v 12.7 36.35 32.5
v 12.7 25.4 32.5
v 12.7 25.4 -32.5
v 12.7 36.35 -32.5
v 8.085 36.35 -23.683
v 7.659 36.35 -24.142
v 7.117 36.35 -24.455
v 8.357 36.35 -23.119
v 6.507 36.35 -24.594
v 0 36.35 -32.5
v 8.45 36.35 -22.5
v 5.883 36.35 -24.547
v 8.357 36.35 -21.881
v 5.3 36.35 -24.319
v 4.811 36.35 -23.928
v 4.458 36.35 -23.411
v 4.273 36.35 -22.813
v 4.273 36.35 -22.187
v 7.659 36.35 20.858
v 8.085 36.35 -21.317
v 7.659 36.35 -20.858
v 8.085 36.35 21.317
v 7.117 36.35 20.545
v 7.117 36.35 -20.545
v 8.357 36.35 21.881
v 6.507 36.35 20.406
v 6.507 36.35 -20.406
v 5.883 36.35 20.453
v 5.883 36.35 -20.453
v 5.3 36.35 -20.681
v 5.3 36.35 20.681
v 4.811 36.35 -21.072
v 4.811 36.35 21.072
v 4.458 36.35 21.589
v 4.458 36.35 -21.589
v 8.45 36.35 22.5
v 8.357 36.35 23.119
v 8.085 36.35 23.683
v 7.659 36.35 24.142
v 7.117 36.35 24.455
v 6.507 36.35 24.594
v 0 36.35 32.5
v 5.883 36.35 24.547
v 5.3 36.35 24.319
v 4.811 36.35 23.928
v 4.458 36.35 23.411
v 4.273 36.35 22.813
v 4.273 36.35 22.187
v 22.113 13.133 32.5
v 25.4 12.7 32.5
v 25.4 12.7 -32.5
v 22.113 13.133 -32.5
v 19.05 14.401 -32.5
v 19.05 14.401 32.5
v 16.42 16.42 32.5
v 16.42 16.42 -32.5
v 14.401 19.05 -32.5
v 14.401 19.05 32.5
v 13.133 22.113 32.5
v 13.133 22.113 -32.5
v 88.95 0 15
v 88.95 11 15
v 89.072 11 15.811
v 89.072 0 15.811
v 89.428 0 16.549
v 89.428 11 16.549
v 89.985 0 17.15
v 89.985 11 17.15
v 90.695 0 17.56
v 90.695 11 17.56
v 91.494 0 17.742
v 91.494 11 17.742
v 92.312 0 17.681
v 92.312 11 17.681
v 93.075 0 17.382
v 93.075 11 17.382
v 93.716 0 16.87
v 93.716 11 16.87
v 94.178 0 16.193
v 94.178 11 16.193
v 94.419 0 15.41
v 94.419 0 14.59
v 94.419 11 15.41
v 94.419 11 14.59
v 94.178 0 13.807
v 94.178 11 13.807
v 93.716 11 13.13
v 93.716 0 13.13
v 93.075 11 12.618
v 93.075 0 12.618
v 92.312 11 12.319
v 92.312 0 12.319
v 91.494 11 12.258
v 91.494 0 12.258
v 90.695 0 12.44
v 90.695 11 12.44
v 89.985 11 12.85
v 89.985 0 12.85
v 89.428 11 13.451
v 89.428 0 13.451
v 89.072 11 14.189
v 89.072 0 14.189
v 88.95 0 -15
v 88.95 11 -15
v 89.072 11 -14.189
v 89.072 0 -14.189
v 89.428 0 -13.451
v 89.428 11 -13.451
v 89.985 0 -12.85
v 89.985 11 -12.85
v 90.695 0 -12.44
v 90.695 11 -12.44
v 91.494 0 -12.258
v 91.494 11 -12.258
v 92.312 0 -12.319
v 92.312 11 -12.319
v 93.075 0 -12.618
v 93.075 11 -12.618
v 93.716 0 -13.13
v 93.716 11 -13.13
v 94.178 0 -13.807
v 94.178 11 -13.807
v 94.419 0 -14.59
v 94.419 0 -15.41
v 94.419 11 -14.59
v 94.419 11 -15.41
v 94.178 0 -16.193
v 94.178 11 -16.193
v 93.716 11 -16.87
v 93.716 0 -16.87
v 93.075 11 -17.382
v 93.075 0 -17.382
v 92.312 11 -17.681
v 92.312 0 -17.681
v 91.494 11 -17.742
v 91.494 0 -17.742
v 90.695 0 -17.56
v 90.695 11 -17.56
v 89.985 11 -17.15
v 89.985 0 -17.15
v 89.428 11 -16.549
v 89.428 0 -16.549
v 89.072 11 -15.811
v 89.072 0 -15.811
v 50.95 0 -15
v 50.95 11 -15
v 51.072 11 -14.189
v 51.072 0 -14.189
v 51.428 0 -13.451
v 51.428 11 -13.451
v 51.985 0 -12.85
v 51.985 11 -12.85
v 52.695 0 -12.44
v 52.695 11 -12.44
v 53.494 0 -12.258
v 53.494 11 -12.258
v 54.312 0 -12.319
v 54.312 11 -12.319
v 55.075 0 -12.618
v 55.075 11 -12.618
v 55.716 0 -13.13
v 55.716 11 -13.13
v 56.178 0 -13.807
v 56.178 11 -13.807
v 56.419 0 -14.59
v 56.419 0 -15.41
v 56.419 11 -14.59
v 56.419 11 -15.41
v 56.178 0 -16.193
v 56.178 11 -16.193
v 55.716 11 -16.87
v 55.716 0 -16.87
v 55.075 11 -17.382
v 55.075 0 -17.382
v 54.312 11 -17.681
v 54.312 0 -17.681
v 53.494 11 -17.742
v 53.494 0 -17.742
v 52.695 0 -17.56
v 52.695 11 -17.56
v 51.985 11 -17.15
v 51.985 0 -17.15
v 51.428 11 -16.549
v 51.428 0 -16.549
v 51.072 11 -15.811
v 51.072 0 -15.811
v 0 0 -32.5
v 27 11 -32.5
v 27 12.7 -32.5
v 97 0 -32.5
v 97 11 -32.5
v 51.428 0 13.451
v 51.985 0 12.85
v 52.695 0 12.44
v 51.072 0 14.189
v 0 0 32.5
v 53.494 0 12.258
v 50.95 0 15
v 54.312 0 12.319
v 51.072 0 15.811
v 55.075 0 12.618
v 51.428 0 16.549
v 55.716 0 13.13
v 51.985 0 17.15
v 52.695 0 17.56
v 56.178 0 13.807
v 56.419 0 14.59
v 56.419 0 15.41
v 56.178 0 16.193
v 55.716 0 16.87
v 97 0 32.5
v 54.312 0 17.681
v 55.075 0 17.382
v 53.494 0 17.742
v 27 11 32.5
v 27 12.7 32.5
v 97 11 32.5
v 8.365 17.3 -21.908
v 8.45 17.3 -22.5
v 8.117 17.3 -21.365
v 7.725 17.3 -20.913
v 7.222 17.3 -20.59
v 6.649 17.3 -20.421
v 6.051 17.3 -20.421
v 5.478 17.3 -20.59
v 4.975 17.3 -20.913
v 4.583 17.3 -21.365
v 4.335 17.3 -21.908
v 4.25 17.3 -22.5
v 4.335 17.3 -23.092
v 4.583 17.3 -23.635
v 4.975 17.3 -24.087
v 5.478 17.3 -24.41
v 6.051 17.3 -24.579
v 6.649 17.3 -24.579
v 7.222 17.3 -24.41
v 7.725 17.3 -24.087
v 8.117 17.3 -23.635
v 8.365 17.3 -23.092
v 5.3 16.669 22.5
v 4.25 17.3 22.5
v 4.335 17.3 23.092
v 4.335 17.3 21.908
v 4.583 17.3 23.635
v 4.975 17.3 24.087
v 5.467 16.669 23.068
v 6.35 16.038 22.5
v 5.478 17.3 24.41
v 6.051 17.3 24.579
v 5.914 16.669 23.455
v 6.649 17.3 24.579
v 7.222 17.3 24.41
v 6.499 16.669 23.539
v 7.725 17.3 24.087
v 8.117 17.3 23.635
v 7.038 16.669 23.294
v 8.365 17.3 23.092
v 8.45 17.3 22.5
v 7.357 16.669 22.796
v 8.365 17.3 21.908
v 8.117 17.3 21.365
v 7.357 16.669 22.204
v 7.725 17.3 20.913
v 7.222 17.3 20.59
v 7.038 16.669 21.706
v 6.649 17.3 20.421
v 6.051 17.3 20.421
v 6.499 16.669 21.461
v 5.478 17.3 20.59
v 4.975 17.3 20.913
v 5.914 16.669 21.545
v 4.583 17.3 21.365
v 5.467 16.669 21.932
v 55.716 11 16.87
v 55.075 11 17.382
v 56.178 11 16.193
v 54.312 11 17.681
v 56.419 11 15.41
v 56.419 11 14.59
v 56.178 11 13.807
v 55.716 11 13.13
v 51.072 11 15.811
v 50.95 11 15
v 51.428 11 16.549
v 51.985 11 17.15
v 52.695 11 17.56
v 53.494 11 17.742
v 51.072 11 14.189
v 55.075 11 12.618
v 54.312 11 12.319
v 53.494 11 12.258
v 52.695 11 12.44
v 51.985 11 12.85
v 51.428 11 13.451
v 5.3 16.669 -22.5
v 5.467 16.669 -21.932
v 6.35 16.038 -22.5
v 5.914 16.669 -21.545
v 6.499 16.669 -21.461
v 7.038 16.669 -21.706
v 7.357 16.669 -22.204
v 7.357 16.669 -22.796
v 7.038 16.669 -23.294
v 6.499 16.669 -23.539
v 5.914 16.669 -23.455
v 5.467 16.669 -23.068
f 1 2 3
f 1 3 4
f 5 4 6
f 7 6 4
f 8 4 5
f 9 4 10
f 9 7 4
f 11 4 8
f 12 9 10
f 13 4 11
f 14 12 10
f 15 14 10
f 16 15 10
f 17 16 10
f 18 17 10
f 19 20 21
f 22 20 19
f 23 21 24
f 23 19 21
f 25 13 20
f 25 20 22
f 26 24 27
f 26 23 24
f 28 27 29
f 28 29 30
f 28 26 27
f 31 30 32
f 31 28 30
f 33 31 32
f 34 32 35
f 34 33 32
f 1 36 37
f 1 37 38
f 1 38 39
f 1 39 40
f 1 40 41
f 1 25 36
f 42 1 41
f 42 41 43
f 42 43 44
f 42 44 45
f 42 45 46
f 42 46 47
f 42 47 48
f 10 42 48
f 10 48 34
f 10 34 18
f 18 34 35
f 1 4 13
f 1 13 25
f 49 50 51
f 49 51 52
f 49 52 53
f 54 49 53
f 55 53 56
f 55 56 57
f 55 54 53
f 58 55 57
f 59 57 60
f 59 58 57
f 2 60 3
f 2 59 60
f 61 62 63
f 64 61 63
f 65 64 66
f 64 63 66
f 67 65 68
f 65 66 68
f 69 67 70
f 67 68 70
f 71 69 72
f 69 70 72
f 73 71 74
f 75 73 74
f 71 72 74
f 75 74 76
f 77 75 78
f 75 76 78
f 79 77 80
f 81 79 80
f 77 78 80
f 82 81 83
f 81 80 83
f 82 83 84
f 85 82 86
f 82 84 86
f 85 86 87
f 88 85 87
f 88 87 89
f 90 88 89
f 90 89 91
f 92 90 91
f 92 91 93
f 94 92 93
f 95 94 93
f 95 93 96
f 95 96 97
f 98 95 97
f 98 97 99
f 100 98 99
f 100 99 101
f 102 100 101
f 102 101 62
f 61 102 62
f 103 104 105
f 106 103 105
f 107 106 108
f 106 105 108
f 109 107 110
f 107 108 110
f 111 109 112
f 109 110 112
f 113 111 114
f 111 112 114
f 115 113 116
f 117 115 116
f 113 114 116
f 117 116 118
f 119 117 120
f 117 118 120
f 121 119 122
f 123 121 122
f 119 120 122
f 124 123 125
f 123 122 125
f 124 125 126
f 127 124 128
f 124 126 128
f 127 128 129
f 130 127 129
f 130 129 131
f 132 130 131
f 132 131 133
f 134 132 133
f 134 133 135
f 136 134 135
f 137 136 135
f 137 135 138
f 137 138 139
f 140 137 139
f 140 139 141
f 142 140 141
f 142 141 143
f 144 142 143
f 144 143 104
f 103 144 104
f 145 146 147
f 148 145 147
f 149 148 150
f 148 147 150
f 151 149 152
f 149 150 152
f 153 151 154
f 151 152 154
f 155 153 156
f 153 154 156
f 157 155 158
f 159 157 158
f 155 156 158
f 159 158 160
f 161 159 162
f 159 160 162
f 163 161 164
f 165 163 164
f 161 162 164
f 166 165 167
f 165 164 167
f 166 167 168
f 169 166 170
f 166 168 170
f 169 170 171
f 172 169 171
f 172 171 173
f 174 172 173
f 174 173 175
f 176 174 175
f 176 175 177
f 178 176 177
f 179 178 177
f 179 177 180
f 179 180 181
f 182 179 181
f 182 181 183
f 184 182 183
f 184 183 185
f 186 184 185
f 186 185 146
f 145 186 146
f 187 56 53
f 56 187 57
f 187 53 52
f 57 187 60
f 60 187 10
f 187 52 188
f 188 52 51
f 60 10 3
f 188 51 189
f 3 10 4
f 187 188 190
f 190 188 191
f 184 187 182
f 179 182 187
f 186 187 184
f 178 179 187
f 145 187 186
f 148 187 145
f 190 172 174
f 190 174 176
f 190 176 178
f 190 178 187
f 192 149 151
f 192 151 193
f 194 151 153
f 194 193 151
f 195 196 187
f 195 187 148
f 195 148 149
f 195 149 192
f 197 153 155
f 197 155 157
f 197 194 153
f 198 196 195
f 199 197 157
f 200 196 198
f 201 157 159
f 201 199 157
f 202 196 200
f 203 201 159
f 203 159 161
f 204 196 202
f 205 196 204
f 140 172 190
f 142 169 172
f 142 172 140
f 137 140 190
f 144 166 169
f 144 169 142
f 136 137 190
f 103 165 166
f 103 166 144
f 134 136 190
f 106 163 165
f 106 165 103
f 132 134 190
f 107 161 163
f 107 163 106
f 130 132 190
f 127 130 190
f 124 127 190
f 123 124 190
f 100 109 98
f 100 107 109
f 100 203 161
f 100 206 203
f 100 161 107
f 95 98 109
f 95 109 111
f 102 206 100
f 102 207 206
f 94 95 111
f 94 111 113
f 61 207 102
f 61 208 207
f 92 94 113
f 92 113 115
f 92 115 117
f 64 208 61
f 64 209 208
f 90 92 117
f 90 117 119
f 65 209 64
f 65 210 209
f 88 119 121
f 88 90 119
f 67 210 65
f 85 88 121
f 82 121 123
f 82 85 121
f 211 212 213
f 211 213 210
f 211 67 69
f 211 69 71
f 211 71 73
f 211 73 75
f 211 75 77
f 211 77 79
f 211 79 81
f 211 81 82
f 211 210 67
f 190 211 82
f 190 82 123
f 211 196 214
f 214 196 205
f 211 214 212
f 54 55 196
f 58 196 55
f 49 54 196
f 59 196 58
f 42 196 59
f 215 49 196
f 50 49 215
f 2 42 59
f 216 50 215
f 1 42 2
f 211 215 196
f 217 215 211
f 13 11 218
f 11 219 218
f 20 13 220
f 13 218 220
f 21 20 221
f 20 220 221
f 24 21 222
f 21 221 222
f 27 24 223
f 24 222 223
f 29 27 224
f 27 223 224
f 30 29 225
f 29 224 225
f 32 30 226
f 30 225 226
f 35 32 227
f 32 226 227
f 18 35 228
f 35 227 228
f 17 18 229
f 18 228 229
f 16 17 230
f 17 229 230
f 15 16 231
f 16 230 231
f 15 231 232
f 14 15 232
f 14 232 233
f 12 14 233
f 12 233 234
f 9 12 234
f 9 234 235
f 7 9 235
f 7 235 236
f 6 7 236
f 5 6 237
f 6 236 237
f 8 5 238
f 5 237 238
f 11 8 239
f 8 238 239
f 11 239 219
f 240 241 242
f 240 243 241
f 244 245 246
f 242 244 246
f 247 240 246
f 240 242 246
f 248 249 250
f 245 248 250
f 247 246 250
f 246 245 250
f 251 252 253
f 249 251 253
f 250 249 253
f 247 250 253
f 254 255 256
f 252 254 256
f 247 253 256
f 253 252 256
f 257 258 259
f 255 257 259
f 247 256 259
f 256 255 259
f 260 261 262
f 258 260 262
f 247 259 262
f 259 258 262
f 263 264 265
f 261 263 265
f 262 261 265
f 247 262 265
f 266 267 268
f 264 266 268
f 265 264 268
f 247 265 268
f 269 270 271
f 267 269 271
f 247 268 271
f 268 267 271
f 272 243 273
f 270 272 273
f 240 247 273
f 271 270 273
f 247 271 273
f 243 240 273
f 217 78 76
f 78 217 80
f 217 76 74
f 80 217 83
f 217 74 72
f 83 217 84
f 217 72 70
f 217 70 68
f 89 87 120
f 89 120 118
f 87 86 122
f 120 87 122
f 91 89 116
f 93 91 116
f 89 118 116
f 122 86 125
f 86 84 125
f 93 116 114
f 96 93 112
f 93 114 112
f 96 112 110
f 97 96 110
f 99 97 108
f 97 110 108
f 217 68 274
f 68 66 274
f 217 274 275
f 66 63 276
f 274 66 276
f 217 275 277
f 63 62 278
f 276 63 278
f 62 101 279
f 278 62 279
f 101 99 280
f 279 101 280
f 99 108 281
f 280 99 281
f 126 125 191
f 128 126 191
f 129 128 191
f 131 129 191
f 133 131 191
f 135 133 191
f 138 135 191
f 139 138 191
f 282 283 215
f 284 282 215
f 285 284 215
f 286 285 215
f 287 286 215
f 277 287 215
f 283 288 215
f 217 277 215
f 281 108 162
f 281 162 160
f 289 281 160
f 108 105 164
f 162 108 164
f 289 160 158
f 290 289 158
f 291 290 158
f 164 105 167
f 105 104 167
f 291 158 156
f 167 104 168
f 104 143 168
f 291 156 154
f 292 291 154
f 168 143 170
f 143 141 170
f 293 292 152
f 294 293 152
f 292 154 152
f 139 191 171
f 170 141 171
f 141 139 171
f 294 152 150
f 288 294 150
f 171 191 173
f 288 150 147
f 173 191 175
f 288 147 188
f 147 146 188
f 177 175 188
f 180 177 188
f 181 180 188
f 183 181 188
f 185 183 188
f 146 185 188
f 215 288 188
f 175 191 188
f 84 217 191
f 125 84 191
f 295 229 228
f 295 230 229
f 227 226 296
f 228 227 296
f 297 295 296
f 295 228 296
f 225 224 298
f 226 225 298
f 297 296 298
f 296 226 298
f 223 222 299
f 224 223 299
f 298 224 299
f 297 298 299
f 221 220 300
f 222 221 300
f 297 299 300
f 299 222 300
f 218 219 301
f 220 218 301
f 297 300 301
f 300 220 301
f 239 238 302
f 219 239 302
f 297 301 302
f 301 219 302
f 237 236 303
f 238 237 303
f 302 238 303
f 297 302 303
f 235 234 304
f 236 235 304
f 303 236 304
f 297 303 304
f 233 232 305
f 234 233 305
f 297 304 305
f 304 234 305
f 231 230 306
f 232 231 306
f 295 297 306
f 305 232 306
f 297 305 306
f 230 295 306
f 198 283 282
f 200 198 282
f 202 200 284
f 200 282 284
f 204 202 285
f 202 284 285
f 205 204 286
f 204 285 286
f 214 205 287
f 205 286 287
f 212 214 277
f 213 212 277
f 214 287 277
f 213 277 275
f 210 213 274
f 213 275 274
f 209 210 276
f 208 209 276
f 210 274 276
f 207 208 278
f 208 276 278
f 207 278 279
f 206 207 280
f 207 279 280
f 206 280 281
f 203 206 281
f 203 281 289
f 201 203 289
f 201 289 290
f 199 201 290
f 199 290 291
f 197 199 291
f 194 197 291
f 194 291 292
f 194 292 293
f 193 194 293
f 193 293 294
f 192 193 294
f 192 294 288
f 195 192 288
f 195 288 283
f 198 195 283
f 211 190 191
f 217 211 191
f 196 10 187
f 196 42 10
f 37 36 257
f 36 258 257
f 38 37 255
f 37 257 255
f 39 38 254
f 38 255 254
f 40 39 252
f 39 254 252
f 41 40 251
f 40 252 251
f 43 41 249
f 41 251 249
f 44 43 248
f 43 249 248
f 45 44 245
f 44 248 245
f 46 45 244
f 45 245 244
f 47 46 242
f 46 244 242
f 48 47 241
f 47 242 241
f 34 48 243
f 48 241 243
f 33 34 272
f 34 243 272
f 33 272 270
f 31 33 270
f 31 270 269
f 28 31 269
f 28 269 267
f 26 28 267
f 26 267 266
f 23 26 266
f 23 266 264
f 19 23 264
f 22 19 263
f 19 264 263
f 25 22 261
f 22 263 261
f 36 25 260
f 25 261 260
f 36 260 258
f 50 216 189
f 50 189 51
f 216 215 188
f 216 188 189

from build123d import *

# Parameters (mm, degrees)
EXTRUDE1_DEPTH            = 32.5
SKETCH2_W                 = 70
SKETCH2_H                 = 1.7
CUT_EXTRUDE1_DEPTH        = 123.291955991
M5_CLEARANCE_HOLE1_D      = 5.5
M5X0_8_TAPPED_HOLE1_D     = 4.2
M5X0_8_TAPPED_HOLE1_DEPTH = 19.05
M5X0_8_TAPPED_HOLE1_TIP   = 1.2618073


with BuildPart() as part:
    # Sketch1 → Extrude1 (new, symmetric)
    with BuildSketch(Plane.XY):
        with BuildLine():
            Line((0, 0), (97, 0))
            Line((97, 0), (97, 12.7))
            Line((97, 12.7), (25.4, 12.7))
            ThreePointArc((25.4, 12.7), (16.419743879, 16.419743879), (12.7, 25.4))
            Line((12.7, 25.4), (12.7, 36.35))
            Line((12.7, 36.35), (0, 36.35))
            Line((0, 36.35), (0, 0))
        make_face()
    extrude(amount=EXTRUDE1_DEPTH, both=True)

    # Sketch2 → Cut-Extrude1 (cut, through all)
    with BuildSketch(Plane(origin=(0, 0, -32.5), x_dir=(-1, 0, 0), z_dir=(0, 0, -1))):
        with Locations((-62, 11.85)):
            Rectangle(SKETCH2_W, SKETCH2_H)
    extrude(amount=-CUT_EXTRUDE1_DEPTH, mode=Mode.SUBTRACT)

    # M5 Clearance Hole1 (through all)
    with Locations(Plane.XZ):
        with Locations((53.7, 15), (91.7, 15), (91.7, -15), (53.7, -15)):
            Hole(M5_CLEARANCE_HOLE1_D / 2)

    # M5x0.8 Tapped Hole1
    with Locations(Plane(origin=(0, 36.35, 0), x_dir=(-1, 0, 0), z_dir=(0, 1, 0))):
        with Locations((-6.35, 22.5), (-6.35, -22.5)):
            Hole(M5X0_8_TAPPED_HOLE1_D / 2, depth=M5X0_8_TAPPED_HOLE1_DEPTH)
            with Locations((0, 0, -(M5X0_8_TAPPED_HOLE1_DEPTH + M5X0_8_TAPPED_HOLE1_TIP / 2))):  # 118° drill point
                Cone(0, M5X0_8_TAPPED_HOLE1_D / 2, M5X0_8_TAPPED_HOLE1_TIP, mode=Mode.SUBTRACT)


solid = part.part
